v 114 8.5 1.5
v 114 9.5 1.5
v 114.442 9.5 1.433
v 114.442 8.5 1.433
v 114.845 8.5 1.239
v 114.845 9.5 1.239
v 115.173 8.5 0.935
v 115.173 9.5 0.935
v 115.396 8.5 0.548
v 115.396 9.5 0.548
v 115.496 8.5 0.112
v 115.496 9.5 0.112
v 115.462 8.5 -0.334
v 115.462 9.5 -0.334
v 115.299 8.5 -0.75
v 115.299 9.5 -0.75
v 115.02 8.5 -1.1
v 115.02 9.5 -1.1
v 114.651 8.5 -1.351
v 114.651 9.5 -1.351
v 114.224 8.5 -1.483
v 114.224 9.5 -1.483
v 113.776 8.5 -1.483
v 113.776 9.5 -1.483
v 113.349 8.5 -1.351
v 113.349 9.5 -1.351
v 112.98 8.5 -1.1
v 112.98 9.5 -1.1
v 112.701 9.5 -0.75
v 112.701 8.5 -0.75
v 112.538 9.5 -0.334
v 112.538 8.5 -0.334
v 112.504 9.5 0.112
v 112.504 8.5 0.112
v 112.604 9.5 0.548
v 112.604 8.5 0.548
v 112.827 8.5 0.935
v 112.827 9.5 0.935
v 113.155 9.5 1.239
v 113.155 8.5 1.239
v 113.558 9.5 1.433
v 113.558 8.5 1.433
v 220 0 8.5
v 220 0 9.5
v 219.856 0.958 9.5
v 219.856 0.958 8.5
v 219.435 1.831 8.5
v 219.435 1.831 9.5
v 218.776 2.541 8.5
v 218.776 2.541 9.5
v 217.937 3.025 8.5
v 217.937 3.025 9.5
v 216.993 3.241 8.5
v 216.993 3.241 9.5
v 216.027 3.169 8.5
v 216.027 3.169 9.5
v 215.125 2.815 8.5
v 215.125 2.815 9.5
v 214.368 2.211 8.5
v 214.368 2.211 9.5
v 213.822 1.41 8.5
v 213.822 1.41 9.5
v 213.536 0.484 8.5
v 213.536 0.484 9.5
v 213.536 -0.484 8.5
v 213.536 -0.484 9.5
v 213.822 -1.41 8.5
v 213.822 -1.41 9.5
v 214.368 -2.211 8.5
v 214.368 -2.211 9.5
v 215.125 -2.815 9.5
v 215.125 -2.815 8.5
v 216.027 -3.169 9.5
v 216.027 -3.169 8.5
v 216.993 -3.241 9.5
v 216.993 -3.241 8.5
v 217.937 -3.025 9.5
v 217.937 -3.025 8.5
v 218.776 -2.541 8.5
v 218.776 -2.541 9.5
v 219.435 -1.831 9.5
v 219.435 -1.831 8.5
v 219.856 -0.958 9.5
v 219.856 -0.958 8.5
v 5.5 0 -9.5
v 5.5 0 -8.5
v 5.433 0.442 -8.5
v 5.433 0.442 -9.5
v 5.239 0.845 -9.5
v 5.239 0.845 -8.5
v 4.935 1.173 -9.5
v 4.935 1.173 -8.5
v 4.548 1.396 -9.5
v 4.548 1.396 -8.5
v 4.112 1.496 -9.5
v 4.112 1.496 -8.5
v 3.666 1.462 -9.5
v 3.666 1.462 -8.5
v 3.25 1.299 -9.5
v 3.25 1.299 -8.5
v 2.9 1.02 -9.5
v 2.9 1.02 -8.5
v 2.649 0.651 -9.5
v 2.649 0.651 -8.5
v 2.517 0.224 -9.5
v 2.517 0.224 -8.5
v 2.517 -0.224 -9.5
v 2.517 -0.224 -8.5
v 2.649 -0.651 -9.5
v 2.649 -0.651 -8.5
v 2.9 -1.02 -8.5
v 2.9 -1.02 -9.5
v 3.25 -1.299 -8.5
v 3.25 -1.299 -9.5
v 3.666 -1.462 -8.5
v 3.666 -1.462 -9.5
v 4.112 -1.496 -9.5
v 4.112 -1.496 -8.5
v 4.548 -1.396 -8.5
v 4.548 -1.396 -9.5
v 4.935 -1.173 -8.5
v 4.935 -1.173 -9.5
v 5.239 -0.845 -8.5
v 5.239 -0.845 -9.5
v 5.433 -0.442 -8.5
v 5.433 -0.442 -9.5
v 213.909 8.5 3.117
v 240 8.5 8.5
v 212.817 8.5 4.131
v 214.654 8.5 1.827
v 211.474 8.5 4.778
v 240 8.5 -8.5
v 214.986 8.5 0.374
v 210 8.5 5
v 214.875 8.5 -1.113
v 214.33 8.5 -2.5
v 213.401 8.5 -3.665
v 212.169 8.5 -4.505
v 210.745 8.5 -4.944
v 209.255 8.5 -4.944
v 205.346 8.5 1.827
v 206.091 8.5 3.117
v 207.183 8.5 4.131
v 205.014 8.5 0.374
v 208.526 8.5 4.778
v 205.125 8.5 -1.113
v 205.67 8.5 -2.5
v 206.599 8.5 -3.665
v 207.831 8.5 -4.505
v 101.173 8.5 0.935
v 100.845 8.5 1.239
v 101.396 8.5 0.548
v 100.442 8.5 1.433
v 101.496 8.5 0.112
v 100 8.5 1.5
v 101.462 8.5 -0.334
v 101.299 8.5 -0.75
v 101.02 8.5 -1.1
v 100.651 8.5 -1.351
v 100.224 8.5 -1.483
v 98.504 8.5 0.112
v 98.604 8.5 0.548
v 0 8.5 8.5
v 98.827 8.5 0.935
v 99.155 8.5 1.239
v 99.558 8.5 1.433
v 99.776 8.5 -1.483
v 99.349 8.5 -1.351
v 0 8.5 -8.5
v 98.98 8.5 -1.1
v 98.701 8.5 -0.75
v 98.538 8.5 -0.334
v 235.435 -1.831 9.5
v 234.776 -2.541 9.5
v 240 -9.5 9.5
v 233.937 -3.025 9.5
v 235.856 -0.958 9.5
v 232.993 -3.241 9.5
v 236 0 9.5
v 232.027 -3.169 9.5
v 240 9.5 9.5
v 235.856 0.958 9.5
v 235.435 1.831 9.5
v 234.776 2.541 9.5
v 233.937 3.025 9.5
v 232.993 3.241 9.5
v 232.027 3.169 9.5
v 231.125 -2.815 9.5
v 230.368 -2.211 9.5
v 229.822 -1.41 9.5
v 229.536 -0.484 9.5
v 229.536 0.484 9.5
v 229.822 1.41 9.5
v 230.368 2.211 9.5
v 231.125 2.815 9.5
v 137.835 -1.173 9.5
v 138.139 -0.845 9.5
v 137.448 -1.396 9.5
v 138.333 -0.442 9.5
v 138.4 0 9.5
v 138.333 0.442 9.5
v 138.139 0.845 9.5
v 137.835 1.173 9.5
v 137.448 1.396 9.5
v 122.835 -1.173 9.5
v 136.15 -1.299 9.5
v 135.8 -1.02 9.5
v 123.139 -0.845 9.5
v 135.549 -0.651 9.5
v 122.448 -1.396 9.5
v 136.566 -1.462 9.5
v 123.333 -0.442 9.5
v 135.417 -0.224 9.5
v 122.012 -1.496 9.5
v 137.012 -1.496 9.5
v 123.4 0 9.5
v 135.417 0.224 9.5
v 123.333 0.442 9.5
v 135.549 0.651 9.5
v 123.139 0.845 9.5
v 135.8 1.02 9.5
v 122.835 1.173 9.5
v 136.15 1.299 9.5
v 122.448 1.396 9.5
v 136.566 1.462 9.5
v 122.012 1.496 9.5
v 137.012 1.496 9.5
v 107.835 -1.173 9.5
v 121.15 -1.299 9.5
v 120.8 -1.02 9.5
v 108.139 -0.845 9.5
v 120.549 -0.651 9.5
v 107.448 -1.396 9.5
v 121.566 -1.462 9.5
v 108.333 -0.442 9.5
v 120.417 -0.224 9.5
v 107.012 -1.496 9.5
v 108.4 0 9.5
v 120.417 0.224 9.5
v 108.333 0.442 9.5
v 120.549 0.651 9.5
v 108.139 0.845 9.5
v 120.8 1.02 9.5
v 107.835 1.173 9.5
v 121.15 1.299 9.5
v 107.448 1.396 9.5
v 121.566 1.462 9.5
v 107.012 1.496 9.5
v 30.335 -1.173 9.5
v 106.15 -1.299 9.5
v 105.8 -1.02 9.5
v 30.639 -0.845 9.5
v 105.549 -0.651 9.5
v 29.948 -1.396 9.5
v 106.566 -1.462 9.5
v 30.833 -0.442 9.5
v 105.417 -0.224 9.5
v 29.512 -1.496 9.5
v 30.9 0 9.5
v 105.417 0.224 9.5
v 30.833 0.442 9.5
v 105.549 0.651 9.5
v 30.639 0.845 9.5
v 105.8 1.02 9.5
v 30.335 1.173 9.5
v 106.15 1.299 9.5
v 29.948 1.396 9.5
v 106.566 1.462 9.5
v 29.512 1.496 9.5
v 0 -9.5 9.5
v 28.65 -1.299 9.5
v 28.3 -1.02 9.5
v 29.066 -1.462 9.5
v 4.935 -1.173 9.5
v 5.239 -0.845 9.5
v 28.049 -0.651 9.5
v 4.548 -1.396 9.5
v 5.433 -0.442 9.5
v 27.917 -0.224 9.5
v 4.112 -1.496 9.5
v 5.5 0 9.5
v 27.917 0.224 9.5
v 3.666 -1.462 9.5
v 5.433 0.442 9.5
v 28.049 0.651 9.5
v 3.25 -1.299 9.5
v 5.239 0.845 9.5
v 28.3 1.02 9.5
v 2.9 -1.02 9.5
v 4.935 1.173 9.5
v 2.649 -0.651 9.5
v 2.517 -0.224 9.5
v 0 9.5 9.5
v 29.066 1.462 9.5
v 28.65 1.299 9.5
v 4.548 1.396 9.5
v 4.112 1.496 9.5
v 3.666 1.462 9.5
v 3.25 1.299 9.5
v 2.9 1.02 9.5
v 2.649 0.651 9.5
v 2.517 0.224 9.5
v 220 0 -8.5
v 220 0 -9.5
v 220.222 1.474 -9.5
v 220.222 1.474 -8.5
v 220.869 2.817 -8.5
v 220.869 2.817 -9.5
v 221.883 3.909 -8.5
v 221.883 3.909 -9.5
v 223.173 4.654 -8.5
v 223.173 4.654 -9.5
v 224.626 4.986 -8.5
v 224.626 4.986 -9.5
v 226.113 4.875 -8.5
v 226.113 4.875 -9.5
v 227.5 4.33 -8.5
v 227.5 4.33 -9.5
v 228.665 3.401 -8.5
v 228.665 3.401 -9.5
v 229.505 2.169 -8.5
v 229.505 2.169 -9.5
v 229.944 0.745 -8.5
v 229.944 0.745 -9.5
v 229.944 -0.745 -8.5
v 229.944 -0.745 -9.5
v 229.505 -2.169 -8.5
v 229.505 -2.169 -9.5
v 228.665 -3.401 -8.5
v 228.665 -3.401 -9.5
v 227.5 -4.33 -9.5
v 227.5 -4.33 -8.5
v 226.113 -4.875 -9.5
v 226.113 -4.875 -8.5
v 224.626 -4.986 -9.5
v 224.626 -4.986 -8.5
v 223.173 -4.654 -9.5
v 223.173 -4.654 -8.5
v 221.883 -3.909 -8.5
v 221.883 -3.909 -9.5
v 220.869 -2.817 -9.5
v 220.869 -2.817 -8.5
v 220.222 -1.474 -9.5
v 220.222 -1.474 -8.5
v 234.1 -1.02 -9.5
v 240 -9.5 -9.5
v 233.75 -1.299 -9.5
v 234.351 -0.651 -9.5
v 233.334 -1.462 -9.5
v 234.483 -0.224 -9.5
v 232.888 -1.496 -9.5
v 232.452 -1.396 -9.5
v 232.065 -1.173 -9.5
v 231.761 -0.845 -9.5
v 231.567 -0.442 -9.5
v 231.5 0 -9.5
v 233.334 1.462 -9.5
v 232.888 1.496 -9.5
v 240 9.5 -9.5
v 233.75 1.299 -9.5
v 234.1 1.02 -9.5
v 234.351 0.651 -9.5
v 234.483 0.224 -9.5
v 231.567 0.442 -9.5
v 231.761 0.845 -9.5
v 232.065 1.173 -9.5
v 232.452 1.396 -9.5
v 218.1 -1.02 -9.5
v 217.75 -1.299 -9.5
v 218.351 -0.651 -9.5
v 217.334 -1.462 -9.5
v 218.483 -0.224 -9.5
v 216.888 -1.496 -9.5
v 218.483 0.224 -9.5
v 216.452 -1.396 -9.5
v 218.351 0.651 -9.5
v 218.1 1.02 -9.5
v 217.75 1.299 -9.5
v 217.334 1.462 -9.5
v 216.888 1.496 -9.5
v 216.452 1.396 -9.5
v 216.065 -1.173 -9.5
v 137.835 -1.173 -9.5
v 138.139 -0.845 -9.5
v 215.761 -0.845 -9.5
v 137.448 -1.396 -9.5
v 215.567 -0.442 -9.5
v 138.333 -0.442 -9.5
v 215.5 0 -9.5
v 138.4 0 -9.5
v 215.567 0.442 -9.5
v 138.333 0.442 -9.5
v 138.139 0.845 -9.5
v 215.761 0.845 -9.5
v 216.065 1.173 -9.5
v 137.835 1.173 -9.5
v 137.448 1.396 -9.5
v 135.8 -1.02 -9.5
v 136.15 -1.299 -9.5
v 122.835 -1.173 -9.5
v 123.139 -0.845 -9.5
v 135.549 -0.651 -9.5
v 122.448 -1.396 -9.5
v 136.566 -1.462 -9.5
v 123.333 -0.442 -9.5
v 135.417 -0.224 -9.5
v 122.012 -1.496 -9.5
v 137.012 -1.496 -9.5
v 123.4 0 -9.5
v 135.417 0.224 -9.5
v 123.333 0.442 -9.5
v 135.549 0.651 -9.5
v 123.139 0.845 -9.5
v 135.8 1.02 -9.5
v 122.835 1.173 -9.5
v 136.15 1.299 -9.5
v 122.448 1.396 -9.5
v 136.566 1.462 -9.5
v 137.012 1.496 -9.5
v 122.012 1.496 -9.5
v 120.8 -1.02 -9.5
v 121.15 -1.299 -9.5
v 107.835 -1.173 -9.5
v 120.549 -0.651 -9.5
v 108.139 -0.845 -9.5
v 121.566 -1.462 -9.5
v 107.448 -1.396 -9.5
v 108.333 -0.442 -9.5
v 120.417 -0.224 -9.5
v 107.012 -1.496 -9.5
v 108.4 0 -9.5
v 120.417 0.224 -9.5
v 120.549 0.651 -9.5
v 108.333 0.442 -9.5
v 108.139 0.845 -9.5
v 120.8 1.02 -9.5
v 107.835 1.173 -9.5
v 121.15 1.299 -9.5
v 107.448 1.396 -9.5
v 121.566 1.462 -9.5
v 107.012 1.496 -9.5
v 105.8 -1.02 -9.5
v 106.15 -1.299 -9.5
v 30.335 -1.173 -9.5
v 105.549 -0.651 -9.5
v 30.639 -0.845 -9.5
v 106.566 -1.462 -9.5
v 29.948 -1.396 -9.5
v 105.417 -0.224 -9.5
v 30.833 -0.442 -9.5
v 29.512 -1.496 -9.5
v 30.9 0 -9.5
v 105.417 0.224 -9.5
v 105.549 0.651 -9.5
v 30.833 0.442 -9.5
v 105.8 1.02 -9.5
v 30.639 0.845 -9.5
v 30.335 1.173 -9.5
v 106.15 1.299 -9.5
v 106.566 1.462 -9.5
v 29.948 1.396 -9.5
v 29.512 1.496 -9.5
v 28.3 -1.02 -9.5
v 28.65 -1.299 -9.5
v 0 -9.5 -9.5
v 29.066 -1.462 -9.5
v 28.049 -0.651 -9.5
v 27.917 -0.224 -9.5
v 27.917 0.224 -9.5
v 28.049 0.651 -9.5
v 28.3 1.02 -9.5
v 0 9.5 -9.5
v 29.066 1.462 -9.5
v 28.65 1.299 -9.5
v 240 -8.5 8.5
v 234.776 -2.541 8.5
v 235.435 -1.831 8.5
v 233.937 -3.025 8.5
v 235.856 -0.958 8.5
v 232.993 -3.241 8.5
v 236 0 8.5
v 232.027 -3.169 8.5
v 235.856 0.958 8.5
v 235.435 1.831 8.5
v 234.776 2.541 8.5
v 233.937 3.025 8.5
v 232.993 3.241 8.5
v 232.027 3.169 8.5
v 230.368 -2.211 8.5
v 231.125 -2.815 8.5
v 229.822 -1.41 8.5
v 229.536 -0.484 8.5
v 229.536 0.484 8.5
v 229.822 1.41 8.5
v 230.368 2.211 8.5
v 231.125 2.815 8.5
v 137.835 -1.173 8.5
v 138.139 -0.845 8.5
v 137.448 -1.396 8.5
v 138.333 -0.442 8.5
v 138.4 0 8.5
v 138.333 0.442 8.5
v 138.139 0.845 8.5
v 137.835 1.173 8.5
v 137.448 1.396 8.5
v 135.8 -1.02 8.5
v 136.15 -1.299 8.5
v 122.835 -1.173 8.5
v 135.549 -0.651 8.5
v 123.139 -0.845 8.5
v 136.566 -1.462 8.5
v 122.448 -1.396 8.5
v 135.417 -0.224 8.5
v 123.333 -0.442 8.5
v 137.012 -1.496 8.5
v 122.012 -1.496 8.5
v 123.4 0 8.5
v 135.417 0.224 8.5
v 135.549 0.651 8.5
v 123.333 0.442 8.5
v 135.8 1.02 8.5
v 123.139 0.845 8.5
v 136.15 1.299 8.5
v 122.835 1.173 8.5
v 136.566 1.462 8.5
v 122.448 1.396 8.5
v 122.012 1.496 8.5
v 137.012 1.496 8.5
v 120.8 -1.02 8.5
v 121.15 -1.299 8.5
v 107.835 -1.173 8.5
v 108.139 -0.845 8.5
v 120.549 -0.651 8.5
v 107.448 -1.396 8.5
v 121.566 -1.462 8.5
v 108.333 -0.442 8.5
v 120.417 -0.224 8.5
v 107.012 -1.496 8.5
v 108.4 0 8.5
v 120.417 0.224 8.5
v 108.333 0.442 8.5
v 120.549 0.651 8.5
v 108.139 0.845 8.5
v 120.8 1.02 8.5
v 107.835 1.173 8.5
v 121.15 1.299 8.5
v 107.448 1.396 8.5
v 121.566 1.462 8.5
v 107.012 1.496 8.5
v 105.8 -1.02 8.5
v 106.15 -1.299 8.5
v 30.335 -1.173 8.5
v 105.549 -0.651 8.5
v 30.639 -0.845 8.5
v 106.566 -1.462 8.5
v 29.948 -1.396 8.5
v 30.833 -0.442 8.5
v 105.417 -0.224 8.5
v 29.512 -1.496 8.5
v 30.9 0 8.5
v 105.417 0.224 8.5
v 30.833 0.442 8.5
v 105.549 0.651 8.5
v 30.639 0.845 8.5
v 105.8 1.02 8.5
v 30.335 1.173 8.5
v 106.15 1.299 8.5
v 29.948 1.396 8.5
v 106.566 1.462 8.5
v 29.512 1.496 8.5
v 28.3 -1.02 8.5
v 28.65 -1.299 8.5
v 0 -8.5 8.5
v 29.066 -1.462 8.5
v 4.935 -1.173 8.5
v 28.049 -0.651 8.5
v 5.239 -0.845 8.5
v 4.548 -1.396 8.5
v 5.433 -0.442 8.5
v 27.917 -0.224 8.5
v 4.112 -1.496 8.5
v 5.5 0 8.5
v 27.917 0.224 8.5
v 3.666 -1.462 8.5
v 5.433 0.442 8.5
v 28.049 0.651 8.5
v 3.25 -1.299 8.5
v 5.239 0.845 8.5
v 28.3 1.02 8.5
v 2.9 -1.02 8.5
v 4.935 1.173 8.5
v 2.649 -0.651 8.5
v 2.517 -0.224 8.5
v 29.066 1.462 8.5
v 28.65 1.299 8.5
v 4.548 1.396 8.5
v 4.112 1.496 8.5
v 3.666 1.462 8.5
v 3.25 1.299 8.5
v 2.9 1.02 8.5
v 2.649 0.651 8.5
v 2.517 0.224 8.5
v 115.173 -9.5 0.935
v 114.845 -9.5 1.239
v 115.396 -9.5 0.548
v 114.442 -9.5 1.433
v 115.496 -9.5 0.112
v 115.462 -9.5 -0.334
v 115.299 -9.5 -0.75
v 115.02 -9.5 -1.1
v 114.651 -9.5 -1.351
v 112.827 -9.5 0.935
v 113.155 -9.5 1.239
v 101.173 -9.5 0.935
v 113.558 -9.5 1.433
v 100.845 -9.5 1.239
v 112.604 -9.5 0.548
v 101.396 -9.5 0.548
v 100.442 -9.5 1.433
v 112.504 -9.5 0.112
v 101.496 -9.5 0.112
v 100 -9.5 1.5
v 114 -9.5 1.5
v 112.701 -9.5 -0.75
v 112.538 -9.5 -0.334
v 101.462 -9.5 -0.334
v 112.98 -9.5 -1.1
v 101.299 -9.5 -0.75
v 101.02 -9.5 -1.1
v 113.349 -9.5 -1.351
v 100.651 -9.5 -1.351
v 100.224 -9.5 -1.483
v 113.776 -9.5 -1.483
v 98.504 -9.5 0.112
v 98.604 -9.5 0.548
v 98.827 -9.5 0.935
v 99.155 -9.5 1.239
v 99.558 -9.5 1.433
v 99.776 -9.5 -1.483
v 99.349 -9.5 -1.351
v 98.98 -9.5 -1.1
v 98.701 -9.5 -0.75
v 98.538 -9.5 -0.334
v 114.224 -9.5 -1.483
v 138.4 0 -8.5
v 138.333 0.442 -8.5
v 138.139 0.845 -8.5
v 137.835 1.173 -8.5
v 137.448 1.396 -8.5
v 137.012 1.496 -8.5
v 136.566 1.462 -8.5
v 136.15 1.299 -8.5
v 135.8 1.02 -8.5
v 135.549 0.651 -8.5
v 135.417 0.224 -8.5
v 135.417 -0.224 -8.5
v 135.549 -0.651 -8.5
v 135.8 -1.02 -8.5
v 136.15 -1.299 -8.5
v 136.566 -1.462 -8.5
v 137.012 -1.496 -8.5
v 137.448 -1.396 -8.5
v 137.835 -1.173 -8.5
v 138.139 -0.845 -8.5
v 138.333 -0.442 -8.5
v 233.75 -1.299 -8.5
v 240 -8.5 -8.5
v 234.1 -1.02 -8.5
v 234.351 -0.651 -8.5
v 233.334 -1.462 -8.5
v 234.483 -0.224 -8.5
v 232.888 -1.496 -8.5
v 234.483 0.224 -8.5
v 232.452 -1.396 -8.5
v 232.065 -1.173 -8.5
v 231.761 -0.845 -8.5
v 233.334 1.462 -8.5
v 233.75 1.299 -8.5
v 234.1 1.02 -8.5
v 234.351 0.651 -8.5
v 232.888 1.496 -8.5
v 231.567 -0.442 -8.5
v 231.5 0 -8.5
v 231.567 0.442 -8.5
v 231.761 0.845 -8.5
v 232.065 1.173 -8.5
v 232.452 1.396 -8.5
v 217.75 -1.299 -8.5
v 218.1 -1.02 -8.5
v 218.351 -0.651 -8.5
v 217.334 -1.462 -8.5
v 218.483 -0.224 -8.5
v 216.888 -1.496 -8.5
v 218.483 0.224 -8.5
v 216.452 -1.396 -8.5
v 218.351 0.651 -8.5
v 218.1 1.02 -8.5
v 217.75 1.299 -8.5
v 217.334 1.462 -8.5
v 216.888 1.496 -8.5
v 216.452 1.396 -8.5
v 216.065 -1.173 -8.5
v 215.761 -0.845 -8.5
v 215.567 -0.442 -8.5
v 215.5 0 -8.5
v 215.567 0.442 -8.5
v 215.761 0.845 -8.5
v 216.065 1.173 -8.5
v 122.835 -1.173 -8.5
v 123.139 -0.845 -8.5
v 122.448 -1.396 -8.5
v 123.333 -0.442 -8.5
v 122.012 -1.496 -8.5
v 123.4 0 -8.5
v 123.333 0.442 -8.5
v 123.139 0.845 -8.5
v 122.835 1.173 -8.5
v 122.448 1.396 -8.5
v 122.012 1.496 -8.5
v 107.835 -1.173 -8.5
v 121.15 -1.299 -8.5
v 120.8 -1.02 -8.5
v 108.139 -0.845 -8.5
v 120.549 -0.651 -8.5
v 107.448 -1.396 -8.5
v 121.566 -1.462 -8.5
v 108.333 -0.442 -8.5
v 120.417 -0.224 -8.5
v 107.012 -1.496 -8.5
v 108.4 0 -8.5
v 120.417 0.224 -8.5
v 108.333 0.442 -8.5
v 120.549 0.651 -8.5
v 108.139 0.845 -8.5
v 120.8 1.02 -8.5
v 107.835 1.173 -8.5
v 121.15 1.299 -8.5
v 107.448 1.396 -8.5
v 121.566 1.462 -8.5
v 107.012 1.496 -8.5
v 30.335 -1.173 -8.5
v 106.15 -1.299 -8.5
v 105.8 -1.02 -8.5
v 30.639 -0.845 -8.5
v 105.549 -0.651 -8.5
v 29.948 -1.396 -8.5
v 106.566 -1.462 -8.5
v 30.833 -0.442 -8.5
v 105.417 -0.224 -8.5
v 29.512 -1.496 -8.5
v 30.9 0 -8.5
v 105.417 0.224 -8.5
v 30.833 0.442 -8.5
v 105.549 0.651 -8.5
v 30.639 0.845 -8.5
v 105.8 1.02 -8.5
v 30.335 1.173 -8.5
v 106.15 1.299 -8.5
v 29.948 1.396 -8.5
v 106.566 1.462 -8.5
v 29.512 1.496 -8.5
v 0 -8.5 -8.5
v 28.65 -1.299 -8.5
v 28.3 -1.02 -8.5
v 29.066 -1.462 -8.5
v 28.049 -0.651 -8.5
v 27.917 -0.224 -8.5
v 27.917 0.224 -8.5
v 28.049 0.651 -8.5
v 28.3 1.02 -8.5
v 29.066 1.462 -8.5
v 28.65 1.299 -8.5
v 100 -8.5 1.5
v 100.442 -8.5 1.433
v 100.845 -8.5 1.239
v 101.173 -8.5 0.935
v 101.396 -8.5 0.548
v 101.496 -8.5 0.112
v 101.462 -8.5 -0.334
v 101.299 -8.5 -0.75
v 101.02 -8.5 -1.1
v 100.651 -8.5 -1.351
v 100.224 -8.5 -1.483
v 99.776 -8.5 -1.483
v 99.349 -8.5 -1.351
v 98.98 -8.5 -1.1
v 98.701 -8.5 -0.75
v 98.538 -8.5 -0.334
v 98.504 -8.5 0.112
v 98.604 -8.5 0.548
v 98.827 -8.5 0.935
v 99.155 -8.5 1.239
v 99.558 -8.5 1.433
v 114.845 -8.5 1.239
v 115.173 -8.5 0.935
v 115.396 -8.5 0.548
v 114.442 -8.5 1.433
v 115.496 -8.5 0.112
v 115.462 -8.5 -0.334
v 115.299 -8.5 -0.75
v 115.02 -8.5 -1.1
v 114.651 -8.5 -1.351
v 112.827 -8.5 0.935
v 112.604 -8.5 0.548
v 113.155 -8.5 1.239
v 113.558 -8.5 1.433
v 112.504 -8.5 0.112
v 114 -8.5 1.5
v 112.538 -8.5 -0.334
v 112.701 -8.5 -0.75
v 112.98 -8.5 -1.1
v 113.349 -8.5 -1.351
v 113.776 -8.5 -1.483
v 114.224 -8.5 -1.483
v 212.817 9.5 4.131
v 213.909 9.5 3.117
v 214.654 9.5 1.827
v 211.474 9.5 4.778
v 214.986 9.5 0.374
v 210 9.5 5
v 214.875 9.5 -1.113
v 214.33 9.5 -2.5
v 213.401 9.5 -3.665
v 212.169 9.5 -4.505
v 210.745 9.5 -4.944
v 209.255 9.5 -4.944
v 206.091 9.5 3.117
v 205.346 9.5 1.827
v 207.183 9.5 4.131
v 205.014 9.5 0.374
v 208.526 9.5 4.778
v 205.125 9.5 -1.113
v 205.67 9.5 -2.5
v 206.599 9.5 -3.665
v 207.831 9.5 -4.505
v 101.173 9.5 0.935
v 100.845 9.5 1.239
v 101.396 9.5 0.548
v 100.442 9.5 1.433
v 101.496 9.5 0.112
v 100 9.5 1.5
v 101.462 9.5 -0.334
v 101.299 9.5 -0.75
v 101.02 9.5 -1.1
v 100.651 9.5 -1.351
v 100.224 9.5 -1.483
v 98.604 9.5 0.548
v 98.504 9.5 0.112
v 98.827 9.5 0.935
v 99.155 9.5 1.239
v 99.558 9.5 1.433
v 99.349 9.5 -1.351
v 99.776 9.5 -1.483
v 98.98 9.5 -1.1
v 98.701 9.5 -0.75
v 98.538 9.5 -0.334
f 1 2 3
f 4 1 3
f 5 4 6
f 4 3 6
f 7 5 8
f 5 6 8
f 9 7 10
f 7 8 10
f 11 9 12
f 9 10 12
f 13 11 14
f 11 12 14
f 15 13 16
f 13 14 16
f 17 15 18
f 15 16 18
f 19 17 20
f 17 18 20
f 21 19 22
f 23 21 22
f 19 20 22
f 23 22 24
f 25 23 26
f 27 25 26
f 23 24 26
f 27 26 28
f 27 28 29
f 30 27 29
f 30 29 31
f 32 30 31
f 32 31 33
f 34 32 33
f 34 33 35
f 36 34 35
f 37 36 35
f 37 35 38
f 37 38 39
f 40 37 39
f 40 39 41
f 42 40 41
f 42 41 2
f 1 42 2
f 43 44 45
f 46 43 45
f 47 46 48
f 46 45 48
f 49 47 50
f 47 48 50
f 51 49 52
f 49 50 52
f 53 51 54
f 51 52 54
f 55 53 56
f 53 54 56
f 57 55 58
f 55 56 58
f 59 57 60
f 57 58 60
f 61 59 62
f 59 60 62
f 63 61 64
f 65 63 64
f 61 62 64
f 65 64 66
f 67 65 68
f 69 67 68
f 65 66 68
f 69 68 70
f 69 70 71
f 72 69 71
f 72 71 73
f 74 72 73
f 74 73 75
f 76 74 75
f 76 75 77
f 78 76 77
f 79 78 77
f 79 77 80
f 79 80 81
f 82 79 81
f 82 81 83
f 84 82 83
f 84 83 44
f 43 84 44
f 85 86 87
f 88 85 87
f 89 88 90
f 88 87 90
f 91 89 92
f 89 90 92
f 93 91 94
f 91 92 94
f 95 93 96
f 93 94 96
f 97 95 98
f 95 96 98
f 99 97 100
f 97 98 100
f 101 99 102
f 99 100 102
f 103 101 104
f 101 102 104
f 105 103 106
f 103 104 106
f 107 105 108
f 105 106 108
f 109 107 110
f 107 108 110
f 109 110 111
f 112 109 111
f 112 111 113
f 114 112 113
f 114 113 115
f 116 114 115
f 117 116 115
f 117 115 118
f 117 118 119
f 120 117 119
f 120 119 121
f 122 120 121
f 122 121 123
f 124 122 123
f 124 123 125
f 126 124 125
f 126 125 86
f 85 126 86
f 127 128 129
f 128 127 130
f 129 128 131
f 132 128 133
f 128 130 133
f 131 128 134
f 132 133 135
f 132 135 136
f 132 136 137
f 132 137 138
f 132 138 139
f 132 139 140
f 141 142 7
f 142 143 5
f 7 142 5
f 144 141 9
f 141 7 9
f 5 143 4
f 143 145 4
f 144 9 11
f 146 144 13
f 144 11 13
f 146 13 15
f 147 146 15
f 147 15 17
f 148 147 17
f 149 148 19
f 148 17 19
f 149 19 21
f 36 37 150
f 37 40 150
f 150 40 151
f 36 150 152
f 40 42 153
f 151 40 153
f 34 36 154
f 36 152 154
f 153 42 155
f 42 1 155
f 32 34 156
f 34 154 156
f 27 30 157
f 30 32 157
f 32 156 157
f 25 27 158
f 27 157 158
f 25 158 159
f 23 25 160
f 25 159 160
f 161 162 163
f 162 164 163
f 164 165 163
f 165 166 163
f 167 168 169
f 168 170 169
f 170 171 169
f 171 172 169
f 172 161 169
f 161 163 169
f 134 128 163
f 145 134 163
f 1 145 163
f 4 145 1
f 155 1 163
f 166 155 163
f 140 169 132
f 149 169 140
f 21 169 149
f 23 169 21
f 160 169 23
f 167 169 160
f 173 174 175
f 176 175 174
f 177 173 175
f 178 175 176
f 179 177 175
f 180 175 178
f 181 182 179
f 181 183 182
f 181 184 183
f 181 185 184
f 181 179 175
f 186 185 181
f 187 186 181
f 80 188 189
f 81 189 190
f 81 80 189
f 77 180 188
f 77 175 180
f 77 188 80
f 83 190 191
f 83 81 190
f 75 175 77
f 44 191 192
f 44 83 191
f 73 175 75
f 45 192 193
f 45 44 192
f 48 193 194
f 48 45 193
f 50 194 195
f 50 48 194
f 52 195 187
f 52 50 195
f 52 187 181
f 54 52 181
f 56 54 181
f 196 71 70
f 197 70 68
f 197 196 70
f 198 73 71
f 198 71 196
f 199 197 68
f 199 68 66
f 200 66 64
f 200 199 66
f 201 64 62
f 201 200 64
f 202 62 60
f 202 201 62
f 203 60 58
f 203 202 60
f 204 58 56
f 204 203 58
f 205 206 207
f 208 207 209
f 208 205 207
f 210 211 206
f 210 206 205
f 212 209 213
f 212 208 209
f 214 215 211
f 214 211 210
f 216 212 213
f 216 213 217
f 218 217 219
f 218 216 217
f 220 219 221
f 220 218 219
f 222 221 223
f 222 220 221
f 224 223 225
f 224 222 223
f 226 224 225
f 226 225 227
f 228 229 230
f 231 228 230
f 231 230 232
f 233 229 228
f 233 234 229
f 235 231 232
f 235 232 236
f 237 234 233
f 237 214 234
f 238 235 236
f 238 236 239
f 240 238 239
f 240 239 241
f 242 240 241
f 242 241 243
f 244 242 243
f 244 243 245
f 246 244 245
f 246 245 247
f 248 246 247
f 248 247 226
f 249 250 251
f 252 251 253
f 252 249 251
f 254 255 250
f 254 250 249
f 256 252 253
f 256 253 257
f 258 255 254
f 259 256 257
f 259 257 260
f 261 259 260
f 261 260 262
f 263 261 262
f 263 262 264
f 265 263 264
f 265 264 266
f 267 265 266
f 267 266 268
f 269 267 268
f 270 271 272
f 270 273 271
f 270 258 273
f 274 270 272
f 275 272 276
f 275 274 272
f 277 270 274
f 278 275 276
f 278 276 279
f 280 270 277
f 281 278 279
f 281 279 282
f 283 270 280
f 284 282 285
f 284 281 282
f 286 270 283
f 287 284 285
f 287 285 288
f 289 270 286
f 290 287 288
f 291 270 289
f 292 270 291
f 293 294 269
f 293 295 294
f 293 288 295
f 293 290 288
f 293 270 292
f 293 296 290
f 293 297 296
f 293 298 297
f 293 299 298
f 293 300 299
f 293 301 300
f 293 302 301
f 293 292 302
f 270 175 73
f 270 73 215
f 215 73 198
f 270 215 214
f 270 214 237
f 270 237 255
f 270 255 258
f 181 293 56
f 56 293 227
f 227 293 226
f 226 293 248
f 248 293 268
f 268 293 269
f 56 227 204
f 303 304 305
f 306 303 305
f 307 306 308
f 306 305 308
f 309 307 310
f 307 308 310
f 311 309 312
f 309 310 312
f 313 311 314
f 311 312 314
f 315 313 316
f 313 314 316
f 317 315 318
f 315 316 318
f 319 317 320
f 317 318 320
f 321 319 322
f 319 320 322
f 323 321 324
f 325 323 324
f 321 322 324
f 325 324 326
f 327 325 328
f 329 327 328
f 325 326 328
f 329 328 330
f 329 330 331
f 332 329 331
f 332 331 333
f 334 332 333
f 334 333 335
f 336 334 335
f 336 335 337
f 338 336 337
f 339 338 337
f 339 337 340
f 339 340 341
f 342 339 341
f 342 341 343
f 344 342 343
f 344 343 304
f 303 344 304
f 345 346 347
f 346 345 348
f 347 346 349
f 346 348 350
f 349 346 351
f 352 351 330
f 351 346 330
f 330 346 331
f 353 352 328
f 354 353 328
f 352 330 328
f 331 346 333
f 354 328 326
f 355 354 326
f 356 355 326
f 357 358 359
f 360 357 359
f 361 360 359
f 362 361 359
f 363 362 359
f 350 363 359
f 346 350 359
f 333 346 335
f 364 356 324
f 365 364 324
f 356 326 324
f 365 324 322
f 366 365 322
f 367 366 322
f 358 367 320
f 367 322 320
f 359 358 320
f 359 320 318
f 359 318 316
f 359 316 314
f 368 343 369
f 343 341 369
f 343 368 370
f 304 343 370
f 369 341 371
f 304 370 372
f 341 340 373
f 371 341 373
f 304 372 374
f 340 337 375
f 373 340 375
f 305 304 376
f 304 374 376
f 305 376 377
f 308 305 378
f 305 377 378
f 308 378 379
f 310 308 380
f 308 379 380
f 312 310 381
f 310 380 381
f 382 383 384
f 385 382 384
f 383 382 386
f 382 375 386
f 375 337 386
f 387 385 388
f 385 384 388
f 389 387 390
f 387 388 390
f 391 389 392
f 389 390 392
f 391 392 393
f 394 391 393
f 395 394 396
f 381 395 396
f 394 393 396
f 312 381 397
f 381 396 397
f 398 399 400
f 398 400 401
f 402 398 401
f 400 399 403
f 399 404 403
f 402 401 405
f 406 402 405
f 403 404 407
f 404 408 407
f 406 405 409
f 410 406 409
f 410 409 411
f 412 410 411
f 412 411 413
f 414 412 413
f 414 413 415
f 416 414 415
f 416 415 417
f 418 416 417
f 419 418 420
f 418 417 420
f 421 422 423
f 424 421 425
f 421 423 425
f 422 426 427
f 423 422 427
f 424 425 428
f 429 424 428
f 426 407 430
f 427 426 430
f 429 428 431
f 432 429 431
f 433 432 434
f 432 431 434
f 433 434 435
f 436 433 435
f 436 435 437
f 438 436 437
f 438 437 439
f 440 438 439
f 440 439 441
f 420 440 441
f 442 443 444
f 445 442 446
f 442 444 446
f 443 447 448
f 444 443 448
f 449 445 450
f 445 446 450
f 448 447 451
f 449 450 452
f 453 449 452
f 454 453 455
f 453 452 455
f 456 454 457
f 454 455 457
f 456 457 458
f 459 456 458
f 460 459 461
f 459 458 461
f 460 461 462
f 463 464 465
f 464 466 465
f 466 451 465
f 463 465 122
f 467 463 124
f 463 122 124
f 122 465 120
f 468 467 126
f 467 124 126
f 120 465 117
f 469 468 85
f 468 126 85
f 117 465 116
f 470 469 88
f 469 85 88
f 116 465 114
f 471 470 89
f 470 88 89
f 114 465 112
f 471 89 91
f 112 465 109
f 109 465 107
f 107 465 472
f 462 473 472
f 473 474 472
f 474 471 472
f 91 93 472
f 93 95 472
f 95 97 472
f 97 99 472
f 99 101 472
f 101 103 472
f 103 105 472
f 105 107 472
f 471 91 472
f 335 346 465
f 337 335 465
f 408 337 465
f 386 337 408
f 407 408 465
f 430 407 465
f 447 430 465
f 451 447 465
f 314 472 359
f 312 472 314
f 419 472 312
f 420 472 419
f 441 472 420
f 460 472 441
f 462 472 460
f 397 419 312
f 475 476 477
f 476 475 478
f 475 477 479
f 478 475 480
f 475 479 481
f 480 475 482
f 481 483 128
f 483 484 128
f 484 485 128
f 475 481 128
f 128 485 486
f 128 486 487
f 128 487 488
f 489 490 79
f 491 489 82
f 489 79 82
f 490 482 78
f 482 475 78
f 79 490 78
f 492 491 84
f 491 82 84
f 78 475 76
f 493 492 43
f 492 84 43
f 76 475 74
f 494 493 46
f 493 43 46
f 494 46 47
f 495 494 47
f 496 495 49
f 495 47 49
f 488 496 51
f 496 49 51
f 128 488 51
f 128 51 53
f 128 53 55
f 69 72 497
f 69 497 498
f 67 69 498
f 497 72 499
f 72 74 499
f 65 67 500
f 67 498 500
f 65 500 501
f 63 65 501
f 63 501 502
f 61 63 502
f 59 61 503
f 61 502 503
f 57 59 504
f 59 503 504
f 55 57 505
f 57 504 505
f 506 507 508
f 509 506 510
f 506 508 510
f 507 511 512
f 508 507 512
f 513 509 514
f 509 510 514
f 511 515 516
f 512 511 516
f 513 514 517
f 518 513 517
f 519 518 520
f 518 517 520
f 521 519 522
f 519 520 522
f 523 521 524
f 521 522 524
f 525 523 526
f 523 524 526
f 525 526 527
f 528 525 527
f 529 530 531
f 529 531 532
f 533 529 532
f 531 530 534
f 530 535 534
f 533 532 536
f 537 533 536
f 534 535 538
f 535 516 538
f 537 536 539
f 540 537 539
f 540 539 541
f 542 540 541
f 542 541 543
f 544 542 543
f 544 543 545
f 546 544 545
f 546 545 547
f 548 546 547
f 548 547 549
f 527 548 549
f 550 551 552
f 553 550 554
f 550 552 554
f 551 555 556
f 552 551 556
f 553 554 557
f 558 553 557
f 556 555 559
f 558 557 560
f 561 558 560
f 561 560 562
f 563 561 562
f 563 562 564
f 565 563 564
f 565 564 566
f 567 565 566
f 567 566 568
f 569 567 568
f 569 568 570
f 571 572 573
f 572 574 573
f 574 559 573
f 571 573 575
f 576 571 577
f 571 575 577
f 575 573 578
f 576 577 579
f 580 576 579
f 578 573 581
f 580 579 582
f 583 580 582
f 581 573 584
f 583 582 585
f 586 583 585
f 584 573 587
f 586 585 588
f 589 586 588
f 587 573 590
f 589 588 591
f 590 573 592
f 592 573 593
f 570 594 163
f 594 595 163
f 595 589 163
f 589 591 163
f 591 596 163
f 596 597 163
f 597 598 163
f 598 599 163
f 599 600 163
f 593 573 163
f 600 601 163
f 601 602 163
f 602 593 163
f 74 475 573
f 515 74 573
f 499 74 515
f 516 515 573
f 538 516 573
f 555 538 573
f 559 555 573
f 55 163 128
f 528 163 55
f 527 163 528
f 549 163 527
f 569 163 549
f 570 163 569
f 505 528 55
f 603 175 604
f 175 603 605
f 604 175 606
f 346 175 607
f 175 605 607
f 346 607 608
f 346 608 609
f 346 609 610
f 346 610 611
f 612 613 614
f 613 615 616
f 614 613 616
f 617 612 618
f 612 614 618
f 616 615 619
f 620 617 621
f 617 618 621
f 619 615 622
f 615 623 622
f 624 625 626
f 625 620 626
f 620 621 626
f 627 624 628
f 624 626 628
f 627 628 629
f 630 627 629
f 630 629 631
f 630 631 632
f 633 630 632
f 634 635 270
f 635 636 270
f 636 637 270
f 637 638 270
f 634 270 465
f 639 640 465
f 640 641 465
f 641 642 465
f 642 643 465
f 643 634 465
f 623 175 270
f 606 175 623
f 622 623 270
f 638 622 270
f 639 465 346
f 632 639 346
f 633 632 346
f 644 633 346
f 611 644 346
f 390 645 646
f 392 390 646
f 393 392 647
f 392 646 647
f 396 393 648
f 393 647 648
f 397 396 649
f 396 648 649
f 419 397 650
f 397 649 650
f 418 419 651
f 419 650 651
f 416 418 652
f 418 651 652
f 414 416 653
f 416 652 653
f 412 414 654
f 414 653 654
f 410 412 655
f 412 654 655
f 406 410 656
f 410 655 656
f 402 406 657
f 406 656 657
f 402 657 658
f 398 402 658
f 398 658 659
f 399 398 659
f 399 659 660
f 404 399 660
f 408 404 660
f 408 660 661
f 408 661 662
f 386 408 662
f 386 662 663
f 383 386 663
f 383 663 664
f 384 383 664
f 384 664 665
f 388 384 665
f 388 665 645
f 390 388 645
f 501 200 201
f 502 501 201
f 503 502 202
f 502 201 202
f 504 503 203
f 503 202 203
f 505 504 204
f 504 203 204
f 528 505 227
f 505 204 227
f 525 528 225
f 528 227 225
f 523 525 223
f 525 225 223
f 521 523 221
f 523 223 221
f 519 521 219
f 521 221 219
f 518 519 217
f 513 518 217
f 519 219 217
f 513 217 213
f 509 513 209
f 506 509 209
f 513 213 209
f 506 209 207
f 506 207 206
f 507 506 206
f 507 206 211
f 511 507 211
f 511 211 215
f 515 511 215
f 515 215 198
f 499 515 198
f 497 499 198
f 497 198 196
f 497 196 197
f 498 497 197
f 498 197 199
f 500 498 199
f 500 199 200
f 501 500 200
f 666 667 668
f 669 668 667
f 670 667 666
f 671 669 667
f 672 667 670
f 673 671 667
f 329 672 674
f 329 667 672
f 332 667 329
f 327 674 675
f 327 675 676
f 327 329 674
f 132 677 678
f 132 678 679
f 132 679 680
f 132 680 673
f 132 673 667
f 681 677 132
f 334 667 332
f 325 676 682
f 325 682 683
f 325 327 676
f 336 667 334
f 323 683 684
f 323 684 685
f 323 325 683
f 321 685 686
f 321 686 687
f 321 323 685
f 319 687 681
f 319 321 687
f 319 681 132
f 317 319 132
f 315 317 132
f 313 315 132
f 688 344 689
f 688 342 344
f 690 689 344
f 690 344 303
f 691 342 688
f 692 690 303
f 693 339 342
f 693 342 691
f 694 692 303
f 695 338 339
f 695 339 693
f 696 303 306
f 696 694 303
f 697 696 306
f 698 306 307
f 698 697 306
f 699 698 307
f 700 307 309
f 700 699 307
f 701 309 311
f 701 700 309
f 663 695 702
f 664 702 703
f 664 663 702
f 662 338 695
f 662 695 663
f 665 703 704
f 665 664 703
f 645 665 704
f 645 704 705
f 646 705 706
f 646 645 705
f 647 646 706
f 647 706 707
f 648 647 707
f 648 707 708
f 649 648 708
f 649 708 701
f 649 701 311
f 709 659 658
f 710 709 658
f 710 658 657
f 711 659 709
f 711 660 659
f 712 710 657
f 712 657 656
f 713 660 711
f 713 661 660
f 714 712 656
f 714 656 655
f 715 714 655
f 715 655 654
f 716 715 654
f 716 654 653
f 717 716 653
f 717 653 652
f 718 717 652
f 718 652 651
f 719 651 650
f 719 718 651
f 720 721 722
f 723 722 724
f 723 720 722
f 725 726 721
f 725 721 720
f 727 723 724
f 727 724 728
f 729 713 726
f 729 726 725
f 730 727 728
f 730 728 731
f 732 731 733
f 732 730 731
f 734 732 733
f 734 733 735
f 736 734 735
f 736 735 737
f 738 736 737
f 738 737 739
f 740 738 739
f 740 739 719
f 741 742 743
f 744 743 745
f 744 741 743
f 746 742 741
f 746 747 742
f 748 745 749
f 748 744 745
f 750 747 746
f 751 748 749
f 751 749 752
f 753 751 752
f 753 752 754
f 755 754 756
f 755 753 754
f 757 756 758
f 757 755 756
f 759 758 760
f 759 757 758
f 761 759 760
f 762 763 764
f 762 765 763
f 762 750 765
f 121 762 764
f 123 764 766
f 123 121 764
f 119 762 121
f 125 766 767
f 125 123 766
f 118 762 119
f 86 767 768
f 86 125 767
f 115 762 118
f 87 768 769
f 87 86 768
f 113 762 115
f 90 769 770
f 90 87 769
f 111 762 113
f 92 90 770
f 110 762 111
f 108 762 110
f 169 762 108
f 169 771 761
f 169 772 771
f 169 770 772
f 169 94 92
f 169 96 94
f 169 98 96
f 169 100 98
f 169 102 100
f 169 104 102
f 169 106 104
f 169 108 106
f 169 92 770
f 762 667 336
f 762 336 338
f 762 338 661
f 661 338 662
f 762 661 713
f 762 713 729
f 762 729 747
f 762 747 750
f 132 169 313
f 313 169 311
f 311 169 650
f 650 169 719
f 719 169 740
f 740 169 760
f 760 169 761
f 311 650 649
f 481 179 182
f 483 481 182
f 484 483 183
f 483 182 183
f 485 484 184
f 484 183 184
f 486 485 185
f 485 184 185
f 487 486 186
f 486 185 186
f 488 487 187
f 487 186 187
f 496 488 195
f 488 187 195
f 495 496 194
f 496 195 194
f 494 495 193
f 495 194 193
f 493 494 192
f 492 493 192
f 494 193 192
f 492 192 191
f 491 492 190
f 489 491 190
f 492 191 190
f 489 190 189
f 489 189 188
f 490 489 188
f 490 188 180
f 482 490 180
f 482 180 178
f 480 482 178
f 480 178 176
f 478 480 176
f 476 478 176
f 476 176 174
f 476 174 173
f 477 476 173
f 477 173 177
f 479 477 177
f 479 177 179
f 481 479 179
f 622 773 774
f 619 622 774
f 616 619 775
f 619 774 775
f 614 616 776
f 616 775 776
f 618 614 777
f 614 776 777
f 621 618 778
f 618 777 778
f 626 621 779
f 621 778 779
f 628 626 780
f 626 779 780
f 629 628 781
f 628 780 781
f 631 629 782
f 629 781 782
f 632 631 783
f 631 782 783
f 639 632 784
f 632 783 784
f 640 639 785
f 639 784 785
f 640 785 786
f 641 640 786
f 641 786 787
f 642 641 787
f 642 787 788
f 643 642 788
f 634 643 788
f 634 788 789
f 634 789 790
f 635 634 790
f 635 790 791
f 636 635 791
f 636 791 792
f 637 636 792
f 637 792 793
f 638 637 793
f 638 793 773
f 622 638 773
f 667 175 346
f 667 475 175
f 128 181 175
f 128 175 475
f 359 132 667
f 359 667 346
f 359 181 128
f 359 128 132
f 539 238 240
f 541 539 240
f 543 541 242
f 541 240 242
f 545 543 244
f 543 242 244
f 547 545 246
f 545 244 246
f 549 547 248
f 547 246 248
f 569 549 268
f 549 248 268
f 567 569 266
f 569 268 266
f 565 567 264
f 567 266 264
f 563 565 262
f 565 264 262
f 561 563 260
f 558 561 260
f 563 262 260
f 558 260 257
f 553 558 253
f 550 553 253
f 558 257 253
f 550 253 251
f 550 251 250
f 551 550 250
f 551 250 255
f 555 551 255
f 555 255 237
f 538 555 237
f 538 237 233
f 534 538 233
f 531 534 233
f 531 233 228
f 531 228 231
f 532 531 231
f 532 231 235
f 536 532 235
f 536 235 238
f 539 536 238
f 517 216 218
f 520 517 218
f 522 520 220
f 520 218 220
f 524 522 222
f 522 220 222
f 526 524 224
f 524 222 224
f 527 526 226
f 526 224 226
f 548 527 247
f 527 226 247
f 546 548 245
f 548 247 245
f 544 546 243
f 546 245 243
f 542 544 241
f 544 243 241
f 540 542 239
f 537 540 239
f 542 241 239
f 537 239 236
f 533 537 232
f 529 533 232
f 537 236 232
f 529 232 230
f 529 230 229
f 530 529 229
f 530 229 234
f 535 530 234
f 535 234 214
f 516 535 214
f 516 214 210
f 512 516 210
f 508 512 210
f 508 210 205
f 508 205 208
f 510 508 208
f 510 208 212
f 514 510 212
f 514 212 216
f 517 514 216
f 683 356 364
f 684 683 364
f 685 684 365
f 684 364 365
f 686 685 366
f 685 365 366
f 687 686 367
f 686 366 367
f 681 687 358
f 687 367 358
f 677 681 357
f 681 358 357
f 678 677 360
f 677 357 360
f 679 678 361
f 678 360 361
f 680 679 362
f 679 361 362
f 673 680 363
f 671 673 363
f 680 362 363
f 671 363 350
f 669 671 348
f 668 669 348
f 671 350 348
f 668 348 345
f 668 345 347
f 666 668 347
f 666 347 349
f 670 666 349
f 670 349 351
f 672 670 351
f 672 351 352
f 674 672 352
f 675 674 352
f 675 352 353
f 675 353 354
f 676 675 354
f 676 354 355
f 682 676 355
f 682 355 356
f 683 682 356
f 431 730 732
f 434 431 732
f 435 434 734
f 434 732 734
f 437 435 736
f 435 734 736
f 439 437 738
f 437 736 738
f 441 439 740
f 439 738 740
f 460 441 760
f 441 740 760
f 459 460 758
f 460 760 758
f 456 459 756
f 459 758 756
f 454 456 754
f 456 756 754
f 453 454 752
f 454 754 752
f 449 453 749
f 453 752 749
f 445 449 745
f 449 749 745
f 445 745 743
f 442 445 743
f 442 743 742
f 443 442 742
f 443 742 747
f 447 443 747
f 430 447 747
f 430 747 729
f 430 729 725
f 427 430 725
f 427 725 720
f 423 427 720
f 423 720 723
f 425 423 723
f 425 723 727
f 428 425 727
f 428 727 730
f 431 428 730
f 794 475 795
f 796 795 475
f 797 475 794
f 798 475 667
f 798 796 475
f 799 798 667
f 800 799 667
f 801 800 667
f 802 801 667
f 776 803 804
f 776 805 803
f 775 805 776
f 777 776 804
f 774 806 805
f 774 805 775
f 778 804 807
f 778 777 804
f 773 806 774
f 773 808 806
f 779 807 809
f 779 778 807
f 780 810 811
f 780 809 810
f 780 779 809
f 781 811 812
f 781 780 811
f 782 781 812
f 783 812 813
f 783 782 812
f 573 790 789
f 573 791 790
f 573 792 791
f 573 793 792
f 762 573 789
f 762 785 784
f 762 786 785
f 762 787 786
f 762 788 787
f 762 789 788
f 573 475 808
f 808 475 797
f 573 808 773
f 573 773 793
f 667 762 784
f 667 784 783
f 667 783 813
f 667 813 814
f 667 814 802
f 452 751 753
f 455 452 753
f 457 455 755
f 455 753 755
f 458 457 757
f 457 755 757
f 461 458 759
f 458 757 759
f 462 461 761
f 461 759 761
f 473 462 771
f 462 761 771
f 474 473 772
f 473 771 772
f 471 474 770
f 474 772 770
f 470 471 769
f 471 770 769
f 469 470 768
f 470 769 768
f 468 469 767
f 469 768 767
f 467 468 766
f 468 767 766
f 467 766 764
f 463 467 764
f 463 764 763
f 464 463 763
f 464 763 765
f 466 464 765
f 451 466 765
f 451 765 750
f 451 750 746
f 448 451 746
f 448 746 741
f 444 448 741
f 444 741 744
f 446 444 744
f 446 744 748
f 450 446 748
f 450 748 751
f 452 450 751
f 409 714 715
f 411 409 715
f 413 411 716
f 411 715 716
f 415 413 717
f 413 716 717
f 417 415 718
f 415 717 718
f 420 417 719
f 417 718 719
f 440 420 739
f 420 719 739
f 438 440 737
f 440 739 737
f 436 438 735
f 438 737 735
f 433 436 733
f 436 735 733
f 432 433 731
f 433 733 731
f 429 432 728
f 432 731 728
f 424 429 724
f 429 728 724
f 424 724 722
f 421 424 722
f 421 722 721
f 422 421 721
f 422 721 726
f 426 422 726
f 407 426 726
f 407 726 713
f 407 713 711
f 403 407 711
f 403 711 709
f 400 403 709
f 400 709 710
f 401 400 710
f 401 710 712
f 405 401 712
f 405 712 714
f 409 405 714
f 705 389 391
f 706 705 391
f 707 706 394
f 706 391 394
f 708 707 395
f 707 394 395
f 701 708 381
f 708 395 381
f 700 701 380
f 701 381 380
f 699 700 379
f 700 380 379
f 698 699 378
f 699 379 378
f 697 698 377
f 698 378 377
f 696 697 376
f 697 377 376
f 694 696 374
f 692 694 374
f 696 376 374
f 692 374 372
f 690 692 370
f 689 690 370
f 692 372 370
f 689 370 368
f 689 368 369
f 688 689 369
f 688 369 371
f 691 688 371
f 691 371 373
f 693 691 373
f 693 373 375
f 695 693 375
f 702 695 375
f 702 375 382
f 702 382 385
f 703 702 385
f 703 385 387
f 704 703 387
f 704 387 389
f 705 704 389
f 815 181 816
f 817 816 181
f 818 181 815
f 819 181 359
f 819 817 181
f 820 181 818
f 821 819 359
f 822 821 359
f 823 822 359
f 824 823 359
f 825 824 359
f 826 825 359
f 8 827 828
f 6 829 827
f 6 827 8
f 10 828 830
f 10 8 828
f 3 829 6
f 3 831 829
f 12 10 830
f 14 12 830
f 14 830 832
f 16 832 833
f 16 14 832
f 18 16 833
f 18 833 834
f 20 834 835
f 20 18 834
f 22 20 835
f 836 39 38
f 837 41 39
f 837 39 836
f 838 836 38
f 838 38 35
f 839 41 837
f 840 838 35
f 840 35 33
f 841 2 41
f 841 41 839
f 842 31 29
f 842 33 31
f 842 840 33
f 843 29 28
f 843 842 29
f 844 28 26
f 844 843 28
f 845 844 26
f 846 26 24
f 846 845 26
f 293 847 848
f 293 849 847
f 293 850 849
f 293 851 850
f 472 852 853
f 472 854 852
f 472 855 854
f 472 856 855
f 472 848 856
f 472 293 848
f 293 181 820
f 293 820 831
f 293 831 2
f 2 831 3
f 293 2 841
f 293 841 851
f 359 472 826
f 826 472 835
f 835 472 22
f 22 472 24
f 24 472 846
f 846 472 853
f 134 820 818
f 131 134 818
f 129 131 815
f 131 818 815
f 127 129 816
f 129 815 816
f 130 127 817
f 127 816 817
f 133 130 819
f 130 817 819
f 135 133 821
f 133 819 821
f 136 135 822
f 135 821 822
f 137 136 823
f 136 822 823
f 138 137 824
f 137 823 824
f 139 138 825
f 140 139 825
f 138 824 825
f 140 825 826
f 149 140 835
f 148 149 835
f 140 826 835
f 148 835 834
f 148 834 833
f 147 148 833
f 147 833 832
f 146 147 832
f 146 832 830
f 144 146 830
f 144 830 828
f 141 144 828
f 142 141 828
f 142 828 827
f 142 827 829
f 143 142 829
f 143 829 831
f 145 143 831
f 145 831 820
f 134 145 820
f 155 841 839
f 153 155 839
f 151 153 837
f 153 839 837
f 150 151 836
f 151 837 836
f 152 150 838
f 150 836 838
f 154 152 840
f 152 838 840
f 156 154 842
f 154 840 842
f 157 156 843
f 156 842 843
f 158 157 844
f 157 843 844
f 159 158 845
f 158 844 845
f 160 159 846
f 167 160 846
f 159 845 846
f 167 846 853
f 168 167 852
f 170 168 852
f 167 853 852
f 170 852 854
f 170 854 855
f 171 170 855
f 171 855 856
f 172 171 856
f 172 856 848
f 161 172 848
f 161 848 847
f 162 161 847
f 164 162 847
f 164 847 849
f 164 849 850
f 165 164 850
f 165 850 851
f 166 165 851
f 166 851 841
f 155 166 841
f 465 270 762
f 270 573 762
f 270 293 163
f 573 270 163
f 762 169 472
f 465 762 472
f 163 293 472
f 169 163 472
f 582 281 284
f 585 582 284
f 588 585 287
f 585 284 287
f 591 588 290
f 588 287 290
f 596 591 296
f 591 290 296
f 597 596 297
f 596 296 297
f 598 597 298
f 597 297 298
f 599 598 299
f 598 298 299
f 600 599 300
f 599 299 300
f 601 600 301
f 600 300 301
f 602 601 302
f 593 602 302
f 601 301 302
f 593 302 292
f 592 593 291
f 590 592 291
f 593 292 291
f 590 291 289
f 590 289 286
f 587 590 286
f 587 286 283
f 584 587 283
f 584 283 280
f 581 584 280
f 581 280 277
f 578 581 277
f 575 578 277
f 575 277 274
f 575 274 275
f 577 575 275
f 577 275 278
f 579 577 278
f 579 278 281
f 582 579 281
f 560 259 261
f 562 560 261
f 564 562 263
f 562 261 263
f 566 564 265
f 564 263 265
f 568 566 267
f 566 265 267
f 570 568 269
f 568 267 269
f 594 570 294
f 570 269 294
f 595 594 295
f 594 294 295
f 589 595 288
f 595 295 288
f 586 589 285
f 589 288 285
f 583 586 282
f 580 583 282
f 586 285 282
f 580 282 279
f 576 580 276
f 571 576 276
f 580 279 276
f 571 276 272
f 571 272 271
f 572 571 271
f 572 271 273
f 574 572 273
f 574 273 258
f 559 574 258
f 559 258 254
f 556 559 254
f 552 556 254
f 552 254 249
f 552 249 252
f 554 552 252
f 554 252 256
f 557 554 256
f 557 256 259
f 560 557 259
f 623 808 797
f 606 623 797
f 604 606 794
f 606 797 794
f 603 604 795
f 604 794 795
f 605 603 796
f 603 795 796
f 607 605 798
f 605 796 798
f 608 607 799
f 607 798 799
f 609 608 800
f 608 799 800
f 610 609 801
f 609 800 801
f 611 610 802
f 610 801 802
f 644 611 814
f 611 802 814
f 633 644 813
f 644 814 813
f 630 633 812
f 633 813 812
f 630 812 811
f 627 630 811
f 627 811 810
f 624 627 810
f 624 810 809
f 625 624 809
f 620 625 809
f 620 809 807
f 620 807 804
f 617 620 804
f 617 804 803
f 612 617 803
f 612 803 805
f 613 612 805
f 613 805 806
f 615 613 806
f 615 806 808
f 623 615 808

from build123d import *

# Parameters (mm, degrees)
SKETCH1_W           = 19
SKETCH1_H           = 19
SKETCH1_W_2         = 17
SKETCH1_H_2         = 17
BOSS_EXTRUDE1_DEPTH = 240
SKETCH3_R           = 1.5
CUT_EXTRUDE1_DEPTH  = 241.938270103
SKETCH7_R           = 1.5
CUT_EXTRUDE5_DEPTH  = 241.938270103
SKETCH9_R           = 5
CUT_EXTRUDE6_DEPTH  = 10
SKETCH10_R          = 3.25
CUT_EXTRUDE7_DEPTH  = 10
SKETCH11_R          = 5
SKETCH11_R_2        = 1.5
CUT_EXTRUDE8_DEPTH  = 10


with BuildPart() as part:
    # Sketch1 → Boss-Extrude1 (new body)
    with BuildSketch(Plane(origin=(0, 0, 0), x_dir=(0, 0, -1), z_dir=(1, 0, 0))):
        Rectangle(SKETCH1_W, SKETCH1_H)
        Rectangle(SKETCH1_W_2, SKETCH1_H_2, mode=Mode.SUBTRACT)
    extrude(amount=BOSS_EXTRUDE1_DEPTH)

    # Sketch3 → Cut-Extrude1 (cut, through all)
    with BuildSketch(Plane.XY.offset(9.5)):
        with Locations((4, 0)):
            Circle(SKETCH3_R)
        with Locations((29.4, 0)):
            Circle(SKETCH3_R)
        with Locations((106.9, 0)):
            Circle(SKETCH3_R)
        with Locations((121.9, 0)):
            Circle(SKETCH3_R)
        with Locations((136.9, 0)):
            Circle(SKETCH3_R)
    extrude(amount=-CUT_EXTRUDE1_DEPTH, mode=Mode.SUBTRACT)

    # Sketch7 → Cut-Extrude5 (cut, through all)
    with BuildSketch(Plane(origin=(0, 9.5, 0), x_dir=(1, 0, 0), z_dir=(0, 1, 0))):
        with Locations(Location((100, 0, 0), (0, 0, 270))):
            Circle(SKETCH7_R)
        with Locations(Location((114, 0, 0), (0, 0, 270))):
            Circle(SKETCH7_R)
    extrude(amount=-CUT_EXTRUDE5_DEPTH, mode=Mode.SUBTRACT)

    # Sketch9 → Cut-Extrude6 (cut)
    with BuildSketch(Plane(origin=(0, 9.5, 0), x_dir=(1, 0, 0), z_dir=(0, 1, 0))):
        with Locations(Location((210, 0, 0), (0, 0, 270))):
            Circle(SKETCH9_R)
    extrude(amount=-CUT_EXTRUDE6_DEPTH, mode=Mode.SUBTRACT)

    # Sketch10 → Cut-Extrude7 (cut)
    with BuildSketch(Plane.XY.offset(9.5)):
        with Locations((232.75, 0)):
            Circle(SKETCH10_R)
        with Locations((216.75, 0)):
            Circle(SKETCH10_R)
    extrude(amount=-CUT_EXTRUDE7_DEPTH, mode=Mode.SUBTRACT)

    # Sketch11 → Cut-Extrude8 (cut)
    with BuildSketch(Plane(origin=(0, 0, -9.5), x_dir=(-1, 0, 0), z_dir=(0, 0, -1))):
        with Locations((-225, 0)):
            Circle(SKETCH11_R)
        with Locations((-217, 0)):
            Circle(SKETCH11_R_2)
        with Locations((-233, 0)):
            Circle(SKETCH11_R_2)
    extrude(amount=-CUT_EXTRUDE8_DEPTH, mode=Mode.SUBTRACT)


solid = part.part
